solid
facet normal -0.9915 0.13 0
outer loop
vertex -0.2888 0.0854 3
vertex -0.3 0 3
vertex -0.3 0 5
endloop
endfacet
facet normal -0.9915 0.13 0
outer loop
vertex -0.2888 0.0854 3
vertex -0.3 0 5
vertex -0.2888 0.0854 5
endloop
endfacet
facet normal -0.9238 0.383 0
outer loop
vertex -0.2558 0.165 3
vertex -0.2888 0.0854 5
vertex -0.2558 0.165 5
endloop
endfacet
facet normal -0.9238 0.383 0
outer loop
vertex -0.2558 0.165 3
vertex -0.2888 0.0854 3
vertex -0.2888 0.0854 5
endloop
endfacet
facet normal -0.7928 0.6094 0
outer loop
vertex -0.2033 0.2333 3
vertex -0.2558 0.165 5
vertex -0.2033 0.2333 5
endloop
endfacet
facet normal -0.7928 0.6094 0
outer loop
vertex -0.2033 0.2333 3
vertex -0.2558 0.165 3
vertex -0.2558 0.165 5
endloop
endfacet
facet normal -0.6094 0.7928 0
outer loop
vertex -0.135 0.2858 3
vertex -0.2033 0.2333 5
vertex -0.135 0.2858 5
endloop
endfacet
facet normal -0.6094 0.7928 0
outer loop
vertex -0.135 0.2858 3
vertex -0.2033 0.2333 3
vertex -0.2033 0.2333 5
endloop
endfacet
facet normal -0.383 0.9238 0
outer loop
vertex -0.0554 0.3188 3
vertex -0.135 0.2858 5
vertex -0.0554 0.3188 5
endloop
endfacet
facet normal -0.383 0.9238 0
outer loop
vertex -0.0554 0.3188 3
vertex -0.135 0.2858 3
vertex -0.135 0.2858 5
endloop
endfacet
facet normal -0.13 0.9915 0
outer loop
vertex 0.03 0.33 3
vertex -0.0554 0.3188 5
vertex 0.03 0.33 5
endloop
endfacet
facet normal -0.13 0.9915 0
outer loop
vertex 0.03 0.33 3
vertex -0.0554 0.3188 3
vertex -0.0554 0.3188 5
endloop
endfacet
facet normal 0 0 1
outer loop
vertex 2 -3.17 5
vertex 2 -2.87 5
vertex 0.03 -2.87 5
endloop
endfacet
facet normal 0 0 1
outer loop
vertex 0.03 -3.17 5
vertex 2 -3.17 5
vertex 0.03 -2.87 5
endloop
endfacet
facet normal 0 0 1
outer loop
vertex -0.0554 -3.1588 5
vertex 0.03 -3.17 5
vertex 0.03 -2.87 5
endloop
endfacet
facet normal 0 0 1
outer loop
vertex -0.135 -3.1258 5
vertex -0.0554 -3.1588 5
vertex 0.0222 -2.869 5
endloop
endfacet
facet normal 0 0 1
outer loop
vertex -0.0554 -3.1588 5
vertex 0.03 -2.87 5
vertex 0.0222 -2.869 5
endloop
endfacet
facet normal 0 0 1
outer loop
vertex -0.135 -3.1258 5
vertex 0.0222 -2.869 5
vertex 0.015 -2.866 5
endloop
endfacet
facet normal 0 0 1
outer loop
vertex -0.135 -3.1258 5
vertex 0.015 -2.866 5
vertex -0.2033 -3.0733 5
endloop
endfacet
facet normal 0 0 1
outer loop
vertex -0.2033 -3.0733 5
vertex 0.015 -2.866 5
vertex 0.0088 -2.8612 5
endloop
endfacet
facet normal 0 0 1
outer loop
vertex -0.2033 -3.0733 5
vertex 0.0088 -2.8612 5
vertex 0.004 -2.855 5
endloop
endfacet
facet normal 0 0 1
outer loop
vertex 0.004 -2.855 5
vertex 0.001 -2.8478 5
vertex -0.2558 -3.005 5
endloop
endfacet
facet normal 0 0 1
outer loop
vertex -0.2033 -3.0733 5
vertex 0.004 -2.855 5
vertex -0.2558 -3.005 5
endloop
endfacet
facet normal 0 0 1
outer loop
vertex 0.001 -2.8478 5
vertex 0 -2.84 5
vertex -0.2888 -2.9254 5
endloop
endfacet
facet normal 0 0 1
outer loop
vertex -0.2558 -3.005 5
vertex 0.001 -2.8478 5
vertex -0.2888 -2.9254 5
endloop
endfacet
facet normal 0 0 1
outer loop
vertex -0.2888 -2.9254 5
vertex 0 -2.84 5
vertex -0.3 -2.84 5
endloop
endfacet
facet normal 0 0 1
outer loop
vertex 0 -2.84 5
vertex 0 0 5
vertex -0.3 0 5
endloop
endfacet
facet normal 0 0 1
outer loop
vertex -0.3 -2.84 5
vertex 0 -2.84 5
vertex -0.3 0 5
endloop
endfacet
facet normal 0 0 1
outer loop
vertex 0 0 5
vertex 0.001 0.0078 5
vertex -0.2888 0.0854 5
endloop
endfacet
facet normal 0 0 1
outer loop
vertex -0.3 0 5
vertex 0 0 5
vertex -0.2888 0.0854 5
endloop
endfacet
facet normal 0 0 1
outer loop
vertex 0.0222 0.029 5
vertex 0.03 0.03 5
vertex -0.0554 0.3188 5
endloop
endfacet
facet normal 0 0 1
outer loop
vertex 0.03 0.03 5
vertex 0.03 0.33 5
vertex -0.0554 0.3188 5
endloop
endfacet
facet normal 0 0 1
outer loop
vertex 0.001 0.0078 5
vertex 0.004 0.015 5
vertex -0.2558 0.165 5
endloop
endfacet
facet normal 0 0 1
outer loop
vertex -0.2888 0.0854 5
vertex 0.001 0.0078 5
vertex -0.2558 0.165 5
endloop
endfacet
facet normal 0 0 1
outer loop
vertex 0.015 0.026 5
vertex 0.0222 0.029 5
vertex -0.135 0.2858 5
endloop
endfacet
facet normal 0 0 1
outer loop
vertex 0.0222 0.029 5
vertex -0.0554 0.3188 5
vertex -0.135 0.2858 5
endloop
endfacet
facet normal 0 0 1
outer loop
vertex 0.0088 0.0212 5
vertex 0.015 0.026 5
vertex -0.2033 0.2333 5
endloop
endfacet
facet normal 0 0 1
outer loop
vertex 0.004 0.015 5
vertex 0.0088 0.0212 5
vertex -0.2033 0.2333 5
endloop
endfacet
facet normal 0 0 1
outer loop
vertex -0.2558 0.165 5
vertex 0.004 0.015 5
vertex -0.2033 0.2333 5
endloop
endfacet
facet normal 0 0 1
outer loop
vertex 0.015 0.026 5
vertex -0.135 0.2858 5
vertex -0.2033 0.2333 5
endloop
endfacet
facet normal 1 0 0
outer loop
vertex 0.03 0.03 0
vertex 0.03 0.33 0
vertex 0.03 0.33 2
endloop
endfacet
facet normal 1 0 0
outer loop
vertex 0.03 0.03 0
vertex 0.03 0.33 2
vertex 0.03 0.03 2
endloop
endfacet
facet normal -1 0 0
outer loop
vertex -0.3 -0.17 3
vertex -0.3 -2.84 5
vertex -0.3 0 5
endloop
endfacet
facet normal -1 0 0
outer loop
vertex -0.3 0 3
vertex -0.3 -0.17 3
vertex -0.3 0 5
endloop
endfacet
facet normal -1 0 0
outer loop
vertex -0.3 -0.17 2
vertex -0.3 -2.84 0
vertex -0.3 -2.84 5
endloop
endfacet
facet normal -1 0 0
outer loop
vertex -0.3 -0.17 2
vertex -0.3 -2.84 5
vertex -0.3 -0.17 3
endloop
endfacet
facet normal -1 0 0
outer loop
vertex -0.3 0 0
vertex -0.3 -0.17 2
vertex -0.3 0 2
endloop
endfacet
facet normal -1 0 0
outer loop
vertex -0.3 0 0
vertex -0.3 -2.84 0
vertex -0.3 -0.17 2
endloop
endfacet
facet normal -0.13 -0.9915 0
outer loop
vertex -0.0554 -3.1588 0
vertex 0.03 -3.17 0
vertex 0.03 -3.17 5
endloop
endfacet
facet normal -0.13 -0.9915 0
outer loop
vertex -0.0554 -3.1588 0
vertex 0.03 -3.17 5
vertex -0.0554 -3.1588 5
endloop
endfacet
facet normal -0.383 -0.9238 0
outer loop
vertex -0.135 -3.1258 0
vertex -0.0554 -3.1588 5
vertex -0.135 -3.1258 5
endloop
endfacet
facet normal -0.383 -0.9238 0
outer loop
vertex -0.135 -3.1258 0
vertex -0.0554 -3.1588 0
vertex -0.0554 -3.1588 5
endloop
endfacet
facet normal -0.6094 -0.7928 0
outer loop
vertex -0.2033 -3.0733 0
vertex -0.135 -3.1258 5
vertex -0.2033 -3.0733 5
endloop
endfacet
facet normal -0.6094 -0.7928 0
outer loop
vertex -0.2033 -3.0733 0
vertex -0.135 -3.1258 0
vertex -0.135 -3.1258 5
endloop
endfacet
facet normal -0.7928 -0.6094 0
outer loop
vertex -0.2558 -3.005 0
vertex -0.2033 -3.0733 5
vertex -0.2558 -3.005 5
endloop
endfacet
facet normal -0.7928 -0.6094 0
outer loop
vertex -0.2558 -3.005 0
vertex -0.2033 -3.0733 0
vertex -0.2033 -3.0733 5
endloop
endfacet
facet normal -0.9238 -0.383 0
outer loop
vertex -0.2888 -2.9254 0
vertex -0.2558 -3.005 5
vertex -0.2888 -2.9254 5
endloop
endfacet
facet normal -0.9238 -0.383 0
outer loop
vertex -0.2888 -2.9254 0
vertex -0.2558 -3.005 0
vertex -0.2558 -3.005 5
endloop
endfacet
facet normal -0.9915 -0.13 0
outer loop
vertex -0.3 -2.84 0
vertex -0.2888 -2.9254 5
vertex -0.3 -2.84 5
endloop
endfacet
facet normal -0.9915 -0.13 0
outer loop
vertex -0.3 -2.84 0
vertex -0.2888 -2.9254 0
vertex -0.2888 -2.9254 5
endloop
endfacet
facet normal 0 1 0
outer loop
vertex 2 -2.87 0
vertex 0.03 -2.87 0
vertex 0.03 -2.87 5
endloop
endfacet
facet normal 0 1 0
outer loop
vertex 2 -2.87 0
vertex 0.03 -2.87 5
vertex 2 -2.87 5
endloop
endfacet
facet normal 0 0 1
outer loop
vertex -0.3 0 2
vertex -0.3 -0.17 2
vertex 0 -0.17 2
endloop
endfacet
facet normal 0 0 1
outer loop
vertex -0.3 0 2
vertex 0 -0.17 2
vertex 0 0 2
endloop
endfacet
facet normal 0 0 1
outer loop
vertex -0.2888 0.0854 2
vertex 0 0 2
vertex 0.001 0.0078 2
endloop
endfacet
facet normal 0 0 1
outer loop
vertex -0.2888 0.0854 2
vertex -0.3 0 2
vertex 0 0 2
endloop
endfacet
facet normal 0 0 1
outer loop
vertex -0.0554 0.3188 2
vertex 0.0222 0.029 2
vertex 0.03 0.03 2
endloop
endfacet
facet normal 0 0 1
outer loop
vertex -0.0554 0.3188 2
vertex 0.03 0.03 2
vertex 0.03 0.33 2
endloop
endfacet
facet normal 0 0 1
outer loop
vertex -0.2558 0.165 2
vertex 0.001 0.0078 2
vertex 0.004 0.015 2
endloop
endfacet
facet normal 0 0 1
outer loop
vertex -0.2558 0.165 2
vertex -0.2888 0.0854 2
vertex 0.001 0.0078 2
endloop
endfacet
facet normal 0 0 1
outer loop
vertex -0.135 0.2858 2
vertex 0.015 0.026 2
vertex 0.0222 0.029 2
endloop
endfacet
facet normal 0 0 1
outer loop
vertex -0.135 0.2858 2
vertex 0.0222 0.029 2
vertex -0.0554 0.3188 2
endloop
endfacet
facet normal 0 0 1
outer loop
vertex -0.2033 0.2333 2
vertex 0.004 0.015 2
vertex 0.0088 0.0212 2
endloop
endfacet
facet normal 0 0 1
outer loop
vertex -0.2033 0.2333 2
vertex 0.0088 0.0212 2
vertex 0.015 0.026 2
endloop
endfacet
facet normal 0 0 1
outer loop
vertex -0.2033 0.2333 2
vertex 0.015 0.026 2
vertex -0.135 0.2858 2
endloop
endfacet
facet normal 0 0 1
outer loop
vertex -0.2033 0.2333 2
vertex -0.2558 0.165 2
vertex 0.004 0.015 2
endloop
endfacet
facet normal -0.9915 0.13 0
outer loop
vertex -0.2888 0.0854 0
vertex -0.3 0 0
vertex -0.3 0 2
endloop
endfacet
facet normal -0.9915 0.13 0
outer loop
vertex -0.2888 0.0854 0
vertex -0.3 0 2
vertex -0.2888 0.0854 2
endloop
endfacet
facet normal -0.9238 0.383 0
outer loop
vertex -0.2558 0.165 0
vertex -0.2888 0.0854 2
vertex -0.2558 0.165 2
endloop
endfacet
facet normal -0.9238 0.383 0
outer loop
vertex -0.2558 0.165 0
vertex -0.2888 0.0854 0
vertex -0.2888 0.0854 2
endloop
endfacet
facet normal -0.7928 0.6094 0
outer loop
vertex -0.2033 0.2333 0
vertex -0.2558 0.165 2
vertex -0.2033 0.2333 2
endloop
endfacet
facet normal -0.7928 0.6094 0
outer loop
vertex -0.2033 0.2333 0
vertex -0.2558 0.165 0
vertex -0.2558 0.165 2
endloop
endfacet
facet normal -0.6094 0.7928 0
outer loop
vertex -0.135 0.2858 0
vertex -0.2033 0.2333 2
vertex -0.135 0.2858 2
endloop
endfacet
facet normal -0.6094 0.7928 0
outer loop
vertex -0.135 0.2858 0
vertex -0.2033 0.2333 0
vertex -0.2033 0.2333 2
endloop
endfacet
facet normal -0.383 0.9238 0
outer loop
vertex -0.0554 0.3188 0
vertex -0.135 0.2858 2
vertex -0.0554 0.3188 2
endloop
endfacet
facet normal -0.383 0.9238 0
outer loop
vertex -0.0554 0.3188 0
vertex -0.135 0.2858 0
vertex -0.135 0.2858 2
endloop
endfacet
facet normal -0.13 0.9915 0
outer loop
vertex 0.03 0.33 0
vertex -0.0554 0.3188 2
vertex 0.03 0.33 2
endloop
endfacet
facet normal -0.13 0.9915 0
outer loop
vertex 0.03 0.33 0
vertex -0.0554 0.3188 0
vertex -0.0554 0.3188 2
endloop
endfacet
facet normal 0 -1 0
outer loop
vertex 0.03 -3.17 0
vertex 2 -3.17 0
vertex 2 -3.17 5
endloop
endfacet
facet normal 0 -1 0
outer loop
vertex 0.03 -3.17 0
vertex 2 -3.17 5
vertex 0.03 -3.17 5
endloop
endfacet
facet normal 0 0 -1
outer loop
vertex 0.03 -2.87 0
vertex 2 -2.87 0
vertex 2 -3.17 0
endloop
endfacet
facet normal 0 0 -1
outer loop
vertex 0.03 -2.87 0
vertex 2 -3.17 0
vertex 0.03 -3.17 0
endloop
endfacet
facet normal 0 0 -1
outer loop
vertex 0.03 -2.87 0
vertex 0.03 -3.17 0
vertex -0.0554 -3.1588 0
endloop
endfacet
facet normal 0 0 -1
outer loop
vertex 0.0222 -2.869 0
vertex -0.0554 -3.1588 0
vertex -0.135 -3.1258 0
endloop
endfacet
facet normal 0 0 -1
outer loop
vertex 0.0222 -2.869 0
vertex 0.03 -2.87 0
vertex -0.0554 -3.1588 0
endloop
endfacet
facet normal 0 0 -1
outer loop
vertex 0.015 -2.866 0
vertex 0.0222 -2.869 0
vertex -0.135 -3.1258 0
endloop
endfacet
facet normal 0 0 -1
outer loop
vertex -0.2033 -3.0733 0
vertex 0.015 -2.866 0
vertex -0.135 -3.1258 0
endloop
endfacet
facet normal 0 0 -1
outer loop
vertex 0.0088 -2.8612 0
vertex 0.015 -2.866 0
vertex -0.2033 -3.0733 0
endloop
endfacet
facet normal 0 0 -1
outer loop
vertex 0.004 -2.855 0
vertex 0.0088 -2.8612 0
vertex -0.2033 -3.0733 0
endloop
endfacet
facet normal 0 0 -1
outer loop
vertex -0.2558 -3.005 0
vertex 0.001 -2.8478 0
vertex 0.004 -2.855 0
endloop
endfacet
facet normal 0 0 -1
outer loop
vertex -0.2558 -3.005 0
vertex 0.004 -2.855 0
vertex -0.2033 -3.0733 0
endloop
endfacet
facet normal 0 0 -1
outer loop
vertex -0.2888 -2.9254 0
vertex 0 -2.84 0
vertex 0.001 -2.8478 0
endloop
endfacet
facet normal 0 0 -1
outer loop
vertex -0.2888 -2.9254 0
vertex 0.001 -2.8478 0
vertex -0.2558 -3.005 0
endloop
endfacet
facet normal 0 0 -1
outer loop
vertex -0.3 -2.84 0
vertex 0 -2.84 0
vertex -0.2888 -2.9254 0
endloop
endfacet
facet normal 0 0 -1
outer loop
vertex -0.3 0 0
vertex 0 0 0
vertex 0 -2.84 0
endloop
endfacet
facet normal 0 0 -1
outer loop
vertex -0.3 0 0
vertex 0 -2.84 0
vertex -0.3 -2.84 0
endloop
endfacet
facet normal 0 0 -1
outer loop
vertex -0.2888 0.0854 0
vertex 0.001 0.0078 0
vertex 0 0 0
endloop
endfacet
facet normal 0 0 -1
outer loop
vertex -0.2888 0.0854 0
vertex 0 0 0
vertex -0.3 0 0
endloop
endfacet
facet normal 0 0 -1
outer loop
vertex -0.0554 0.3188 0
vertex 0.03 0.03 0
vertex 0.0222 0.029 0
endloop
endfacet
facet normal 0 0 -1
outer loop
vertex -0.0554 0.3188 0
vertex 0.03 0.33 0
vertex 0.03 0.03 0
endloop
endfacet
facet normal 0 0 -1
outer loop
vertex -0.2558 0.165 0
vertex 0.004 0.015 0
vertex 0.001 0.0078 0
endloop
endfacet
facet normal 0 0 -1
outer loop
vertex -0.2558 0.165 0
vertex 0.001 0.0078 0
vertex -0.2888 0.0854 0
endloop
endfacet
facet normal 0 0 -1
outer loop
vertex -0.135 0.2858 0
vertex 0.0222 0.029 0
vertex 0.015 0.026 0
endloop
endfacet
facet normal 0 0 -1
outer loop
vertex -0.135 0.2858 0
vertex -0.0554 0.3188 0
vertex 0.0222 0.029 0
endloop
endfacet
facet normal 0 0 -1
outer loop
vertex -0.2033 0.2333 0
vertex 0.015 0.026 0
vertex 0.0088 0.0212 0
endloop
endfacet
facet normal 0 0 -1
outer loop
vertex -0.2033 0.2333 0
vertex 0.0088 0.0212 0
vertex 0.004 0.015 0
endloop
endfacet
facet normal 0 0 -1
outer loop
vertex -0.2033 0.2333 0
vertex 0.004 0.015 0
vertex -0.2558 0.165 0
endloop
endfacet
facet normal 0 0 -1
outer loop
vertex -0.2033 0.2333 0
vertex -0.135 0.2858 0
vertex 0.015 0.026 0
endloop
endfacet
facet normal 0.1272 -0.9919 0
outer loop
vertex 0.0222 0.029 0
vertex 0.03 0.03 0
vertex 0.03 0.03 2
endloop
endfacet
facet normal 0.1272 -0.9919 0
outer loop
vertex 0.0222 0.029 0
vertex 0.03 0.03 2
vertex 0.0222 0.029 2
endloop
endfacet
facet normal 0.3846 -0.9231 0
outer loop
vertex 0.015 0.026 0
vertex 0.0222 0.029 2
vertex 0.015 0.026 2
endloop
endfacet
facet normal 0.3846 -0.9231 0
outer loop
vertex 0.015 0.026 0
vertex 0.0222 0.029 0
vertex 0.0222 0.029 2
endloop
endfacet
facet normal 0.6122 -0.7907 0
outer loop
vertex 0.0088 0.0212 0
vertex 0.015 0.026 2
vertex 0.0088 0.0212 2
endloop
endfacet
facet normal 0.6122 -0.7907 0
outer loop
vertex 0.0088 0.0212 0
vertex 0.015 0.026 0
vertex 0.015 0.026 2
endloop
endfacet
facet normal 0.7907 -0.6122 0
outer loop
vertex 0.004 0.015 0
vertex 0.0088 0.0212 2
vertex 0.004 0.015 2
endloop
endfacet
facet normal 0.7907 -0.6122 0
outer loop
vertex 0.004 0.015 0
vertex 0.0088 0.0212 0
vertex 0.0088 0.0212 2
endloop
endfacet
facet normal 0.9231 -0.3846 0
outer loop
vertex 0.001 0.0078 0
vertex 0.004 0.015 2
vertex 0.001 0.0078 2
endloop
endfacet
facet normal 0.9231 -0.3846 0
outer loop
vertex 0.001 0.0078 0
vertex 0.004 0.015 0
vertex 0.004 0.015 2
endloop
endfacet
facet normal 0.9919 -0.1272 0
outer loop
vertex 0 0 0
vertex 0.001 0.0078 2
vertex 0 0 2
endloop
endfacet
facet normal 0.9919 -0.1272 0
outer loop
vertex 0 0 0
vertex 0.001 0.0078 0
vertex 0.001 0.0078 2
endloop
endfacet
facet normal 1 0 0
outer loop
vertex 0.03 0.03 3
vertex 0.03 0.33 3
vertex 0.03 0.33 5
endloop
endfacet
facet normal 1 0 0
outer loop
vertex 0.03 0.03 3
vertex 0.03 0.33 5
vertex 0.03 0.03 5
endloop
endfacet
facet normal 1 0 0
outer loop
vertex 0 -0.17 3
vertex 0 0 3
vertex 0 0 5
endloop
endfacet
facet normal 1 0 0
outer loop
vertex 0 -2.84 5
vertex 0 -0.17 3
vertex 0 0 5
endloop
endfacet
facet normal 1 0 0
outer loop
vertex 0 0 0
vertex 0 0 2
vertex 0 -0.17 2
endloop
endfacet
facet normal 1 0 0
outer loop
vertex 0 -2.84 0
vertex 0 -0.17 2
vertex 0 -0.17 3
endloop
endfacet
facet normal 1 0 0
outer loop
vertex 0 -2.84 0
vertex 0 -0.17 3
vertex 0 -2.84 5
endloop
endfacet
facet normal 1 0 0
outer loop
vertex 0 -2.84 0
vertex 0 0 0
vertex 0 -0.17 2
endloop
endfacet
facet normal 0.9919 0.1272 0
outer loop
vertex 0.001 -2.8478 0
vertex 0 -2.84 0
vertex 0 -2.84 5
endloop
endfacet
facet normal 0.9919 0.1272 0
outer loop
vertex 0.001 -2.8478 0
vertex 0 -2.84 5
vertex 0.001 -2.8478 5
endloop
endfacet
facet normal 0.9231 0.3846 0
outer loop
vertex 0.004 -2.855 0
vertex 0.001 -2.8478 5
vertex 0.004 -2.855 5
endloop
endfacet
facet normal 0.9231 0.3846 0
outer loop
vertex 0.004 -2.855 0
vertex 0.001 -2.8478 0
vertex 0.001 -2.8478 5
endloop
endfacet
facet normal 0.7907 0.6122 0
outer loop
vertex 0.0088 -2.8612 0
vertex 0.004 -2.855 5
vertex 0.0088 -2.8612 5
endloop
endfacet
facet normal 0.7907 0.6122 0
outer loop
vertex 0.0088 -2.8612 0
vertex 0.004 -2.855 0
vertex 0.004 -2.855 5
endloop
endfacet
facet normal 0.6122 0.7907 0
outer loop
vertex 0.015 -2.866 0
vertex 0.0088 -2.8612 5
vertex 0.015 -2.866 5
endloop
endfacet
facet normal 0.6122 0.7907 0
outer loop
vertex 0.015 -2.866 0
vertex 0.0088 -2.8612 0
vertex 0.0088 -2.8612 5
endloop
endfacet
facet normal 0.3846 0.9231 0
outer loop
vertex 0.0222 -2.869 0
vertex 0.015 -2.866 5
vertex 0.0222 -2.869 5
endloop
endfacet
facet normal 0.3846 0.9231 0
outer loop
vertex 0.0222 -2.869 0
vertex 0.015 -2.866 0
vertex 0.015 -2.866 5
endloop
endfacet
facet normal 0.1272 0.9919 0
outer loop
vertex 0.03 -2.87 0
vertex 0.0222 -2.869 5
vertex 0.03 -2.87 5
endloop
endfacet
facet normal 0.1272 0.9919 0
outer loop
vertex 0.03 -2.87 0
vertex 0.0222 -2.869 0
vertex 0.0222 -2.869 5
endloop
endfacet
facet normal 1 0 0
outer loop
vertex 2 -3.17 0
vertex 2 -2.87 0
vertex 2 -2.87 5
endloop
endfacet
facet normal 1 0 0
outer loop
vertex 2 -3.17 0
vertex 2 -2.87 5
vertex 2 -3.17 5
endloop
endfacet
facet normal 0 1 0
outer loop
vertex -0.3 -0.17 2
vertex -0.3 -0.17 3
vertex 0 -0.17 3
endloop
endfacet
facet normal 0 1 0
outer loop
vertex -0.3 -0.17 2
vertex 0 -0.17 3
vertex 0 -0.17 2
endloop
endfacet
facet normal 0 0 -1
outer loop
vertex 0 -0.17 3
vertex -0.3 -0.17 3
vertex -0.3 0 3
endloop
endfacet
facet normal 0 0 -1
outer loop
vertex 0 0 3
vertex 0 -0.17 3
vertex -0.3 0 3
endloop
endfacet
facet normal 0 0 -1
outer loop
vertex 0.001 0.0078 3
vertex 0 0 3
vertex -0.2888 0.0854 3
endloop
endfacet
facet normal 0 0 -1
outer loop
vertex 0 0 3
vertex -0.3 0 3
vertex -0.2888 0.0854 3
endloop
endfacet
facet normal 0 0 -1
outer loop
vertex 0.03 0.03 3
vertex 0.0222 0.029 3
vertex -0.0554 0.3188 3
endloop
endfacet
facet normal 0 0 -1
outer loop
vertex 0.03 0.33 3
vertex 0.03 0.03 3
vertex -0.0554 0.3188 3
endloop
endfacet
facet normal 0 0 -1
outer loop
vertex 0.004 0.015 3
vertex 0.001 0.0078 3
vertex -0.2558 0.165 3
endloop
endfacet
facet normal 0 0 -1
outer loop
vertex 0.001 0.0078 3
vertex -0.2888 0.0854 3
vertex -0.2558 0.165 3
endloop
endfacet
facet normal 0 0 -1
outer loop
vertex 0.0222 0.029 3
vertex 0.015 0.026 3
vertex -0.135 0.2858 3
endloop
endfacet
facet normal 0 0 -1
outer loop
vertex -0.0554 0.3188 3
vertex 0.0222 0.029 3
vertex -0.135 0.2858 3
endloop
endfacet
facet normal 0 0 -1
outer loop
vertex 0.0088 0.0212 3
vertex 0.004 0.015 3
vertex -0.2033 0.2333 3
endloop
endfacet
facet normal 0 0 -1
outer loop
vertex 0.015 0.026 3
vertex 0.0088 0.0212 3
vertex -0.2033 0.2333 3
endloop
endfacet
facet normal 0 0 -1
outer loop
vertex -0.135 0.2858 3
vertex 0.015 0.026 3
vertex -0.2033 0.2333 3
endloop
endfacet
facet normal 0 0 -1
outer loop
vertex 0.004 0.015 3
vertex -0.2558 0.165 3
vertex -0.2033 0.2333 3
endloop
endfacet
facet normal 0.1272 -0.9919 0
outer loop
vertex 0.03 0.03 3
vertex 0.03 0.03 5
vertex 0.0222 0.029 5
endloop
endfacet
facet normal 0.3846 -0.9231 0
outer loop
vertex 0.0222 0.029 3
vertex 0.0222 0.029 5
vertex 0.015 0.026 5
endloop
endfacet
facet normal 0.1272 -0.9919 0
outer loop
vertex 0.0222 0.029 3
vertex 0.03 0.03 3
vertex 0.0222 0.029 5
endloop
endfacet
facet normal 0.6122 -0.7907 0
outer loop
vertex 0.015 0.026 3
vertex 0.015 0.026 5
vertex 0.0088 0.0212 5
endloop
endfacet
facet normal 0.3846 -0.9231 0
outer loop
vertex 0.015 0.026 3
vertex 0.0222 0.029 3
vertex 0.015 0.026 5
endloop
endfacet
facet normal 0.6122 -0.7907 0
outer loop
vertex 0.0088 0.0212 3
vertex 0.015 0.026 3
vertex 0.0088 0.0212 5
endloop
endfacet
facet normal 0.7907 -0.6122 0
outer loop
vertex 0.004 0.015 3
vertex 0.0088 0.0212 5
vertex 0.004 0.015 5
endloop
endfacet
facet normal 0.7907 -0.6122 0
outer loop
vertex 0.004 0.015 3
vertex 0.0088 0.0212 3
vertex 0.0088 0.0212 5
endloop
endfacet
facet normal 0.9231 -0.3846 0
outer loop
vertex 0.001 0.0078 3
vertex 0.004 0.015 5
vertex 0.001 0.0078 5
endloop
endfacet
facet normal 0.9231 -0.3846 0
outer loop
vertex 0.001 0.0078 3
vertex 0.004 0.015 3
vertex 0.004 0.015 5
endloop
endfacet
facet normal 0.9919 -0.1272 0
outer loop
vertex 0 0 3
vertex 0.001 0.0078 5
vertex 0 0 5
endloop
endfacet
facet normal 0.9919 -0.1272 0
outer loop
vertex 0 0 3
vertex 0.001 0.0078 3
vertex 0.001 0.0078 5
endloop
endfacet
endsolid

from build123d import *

# Parameters (mm, degrees)
EXTRUDE_1_DEPTH          = 5
CUT_EXTRUDE_1_DEPTH      = 7.239374969
CUT_EXTRUDE_1_DEPTH_BACK = 7.239374969
SKETCH_2_W               = 1
SKETCH_2_H               = 0.5


with BuildPart() as part:
    # 草图1 → 拉伸-薄壁1 (new body)
    with BuildSketch(Plane.XY):
        with BuildLine():
            ThreePointArc((0.03, 0.03), (0.008786797, 0.021213203), (0, 0))
            Line((0, 0), (0, -2.84))
            ThreePointArc((0, -2.84), (0.008786797, -2.861213203), (0.03, -2.87))
            Line((0.03, -2.87), (2, -2.87))
            Line((2, -2.87), (2, -3.17))
            Line((2, -3.17), (0.03, -3.17))
            ThreePointArc((0.03, -3.17), (-0.203345238, -3.073345238), (-0.3, -2.84))
            Line((-0.3, -2.84), (-0.3, 0))
            ThreePointArc((-0.3, 0), (-0.203345238, 0.233345238), (0.03, 0.33))
            Line((0.03, 0.33), (0.03, 0.03))
        make_face()
    extrude(amount=EXTRUDE_1_DEPTH)

    # 草图2 → 切除-拉伸1 (cut, two sides: drawn at the far end of the back side and taken through both)
    with BuildSketch(Plane(origin=(0.03, 0, 0), x_dir=(0, 0, -1), z_dir=(1, 0, 0)).offset(-CUT_EXTRUDE_1_DEPTH_BACK)):
        with Locations((-2.5, 0.08)):
            Rectangle(SKETCH_2_W, SKETCH_2_H)
    extrude(amount=CUT_EXTRUDE_1_DEPTH + CUT_EXTRUDE_1_DEPTH_BACK, mode=Mode.SUBTRACT)


solid = part.part
